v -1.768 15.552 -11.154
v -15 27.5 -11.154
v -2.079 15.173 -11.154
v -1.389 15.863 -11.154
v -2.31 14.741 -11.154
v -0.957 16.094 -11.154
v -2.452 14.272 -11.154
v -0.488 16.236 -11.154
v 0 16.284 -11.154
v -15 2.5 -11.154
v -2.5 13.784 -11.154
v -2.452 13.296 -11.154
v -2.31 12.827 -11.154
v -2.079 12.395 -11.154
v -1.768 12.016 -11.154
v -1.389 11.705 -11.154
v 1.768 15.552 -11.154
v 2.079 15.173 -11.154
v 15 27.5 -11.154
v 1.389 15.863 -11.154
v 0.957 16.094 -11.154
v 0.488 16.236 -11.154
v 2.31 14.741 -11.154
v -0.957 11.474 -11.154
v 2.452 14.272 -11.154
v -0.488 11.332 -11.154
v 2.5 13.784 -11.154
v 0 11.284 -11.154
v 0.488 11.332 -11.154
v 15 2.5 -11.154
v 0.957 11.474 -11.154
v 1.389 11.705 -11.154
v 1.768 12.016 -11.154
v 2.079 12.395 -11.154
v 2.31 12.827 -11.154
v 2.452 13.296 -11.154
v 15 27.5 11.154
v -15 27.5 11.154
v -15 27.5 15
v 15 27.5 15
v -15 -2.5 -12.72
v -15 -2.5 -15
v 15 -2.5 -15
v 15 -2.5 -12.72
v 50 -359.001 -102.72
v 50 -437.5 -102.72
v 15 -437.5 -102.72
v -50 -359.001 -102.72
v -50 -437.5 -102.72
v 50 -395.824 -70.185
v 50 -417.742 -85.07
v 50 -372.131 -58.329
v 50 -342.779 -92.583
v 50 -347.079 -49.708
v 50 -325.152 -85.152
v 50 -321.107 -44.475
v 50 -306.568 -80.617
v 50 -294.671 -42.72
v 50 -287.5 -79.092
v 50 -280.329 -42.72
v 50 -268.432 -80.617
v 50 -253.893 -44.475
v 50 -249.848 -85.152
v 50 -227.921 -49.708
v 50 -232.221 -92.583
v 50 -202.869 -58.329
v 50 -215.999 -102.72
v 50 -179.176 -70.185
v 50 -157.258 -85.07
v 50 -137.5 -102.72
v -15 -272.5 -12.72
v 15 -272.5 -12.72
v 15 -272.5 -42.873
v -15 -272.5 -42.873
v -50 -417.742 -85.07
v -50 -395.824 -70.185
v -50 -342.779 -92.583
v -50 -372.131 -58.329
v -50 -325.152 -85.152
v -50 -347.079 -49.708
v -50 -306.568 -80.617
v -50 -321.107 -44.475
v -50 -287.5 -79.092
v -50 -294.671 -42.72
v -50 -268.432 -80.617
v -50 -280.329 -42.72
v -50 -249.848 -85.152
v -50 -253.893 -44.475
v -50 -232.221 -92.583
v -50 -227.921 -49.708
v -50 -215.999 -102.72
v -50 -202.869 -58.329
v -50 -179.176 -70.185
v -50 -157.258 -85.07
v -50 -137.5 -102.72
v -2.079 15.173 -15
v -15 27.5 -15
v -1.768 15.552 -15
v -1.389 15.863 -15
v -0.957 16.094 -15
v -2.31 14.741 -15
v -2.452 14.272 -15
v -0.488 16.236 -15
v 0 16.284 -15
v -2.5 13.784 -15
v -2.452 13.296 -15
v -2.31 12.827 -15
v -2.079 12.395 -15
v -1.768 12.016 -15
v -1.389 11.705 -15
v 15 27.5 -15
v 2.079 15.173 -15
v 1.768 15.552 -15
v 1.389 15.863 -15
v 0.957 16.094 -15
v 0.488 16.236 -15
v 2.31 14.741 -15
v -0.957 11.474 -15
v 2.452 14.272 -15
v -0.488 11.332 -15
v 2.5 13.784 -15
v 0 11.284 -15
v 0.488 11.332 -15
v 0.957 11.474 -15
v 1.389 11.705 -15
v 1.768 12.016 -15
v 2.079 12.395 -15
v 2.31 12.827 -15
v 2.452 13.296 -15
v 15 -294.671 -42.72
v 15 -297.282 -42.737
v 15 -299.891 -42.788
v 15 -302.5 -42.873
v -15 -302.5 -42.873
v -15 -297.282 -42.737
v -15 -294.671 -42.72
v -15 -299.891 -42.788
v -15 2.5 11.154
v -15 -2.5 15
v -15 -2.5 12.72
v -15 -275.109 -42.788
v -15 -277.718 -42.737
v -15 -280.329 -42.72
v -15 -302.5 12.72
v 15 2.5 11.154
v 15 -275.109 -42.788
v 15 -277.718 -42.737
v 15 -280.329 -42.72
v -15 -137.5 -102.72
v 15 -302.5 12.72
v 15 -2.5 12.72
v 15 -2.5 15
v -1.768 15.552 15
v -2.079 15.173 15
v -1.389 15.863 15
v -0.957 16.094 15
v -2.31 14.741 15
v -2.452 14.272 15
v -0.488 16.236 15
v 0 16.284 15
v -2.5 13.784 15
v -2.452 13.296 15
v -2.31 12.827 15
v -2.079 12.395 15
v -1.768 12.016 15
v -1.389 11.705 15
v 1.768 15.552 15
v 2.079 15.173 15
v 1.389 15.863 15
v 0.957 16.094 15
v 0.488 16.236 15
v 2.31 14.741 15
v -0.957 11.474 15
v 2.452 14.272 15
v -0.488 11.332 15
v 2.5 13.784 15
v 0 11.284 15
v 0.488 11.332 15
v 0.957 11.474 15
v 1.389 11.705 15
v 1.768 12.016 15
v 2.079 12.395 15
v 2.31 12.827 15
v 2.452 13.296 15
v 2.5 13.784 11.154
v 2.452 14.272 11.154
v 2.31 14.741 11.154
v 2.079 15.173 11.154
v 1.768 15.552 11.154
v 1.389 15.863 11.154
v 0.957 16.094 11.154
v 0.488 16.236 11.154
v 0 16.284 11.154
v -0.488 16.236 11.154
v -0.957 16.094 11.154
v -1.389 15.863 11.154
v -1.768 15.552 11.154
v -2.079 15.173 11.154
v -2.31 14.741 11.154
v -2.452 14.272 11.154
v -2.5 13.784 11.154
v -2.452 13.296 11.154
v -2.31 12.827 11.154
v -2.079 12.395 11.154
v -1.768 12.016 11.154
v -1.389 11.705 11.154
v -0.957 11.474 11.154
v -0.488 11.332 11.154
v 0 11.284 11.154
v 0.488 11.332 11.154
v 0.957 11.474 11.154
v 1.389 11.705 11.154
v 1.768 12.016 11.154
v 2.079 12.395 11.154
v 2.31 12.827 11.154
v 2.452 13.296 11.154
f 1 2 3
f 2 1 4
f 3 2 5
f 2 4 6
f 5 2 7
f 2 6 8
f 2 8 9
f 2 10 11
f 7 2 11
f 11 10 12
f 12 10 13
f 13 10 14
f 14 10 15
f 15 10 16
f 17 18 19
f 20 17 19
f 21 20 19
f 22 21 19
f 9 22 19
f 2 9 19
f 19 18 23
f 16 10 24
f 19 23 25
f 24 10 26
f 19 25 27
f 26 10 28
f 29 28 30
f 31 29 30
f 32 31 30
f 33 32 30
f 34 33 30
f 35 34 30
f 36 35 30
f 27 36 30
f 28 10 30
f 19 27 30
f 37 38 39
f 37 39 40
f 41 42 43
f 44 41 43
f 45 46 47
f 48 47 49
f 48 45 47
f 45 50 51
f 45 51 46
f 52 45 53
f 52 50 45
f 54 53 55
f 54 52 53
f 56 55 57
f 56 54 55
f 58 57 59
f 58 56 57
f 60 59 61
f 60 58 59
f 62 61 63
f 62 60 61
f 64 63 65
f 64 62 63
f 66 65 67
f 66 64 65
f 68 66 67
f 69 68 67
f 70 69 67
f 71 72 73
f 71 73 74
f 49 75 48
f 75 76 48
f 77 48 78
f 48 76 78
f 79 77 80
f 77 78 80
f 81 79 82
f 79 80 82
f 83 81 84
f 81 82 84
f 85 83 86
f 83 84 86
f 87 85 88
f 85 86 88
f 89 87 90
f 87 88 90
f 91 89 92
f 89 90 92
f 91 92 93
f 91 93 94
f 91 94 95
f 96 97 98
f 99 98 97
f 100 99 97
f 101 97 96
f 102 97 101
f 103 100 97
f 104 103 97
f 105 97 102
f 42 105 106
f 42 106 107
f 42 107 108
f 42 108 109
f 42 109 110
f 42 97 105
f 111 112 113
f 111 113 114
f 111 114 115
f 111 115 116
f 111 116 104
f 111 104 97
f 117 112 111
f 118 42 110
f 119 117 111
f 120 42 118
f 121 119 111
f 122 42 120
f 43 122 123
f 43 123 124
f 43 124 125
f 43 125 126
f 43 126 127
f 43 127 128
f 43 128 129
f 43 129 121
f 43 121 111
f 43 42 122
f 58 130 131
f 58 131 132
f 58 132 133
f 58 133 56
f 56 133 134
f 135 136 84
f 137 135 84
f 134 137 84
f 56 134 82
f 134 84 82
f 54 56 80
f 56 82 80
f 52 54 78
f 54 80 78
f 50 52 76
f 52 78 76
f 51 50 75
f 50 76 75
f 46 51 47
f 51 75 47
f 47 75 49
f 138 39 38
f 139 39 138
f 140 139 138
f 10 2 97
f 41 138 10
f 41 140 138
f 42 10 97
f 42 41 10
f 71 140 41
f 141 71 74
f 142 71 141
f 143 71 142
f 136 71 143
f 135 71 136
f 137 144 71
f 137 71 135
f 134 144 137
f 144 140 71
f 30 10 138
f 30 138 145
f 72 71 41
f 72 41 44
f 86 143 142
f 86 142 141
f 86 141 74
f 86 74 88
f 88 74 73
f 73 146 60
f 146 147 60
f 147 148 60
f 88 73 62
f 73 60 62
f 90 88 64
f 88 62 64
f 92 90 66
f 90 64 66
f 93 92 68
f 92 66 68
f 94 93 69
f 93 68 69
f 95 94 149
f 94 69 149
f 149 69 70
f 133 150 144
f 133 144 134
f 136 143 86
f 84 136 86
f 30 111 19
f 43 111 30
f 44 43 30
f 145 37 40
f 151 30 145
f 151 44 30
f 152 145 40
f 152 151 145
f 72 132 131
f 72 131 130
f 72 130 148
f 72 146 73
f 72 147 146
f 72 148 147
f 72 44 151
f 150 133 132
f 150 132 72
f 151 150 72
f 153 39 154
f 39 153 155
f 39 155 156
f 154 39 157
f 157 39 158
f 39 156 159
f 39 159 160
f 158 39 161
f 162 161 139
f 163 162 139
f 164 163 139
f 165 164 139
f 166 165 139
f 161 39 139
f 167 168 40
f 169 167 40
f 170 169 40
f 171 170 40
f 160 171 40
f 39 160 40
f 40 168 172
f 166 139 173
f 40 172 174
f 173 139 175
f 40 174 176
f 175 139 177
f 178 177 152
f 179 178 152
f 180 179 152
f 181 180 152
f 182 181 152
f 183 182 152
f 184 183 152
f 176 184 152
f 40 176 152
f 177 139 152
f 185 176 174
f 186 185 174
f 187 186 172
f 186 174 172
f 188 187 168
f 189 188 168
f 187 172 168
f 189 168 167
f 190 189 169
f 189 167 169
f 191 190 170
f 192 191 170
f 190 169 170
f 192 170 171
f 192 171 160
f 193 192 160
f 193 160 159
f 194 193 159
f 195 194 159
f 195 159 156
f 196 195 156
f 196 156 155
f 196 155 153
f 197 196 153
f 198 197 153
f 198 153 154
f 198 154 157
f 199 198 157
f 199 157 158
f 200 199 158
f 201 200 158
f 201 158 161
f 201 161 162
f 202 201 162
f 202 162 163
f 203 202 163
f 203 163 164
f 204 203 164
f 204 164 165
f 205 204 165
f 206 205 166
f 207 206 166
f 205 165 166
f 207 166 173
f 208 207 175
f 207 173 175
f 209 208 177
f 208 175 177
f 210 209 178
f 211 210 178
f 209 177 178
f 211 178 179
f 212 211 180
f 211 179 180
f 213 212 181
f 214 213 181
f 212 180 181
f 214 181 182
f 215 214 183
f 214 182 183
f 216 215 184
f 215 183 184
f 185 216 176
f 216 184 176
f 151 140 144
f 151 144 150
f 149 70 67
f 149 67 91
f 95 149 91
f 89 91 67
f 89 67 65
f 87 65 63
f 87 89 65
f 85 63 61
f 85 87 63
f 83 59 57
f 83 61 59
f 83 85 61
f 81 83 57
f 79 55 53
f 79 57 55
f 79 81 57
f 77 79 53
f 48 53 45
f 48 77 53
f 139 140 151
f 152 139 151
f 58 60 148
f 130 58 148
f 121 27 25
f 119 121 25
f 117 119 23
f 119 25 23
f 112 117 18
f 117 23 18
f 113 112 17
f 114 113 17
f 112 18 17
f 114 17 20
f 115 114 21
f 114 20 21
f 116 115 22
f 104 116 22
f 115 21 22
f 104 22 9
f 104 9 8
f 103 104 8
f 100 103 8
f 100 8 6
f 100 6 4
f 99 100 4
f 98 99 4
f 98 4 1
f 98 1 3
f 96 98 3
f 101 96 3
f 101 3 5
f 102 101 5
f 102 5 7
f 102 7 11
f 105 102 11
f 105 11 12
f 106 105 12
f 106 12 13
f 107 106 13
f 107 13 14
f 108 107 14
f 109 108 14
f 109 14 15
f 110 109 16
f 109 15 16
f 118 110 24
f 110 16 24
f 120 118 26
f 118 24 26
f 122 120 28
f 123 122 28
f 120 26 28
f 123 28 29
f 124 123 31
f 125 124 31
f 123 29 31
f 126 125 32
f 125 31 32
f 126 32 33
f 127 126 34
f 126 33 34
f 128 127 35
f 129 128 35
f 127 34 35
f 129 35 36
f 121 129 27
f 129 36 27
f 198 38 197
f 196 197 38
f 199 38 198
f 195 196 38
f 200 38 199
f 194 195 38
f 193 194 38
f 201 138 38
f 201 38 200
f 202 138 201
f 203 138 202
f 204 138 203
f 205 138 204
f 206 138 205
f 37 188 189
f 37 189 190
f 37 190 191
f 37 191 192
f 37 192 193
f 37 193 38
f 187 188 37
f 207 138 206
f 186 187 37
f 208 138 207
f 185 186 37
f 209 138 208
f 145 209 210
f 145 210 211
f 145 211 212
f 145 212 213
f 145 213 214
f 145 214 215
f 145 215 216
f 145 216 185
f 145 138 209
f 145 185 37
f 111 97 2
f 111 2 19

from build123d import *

# Parameters (mm, degrees)
SKETCH_1_W               = 30
SKETCH_1_H               = 22.307
EXTRUDE_1_DEPTH          = 2.5
EXTRUDE_START            = -5
SKETCH_4_W               = 30
SKETCH_4_H               = 3.8465
EXTRUDE_5_DEPTH          = 30
SKETCH_5_R               = 2.5
CUT_EXTRUDE_1_DEPTH      = 44.373378932
SKETCH_6_W               = 30
SKETCH_6_H               = 25.44
EXTRUDE_6_DEPTH          = 300
SKETCH_8_W               = 30
SKETCH_8_H               = 30
EXTRUDE_8_DEPTH          = 30
SKETCH_10_W              = 100
SKETCH_10_H              = 300
EXTRUDE_9_DEPTH          = 60
FILLET_1_R               = 200
FILLET_2_R               = 200
CUT_EXTRUDE_3_DEPTH      = 461.388584133
CUT_EXTRUDE_3_DEPTH_BACK = 461.388584133


with BuildPart() as part:
    # 草图1 → 凸台-拉伸1 (new, symmetric)
    with BuildSketch(Plane(origin=(0, 0, 0), x_dir=(1, 0, 0), z_dir=(0, 1, 0))):
        Rectangle(SKETCH_1_W, SKETCH_1_H)
    extrude(amount=EXTRUDE_1_DEPTH, both=True)

    # 草图4 → 凸台-拉伸5 (add)
    with BuildSketch(Plane(origin=(0, 2.5, 0), x_dir=(1, 0, 0), z_dir=(0, 1, 0)).offset(EXTRUDE_START)):
        with Locations((0, -13.07675)):
            Rectangle(SKETCH_4_W, SKETCH_4_H)
        with Locations((0, 13.07675)):
            Rectangle(SKETCH_4_W, SKETCH_4_H)
    extrude(amount=EXTRUDE_5_DEPTH)

    # 草图5 → 切除-拉伸1 (cut, through all)
    with BuildSketch(Plane.XY.offset(15)):
        with Locations((0, 13.784)):
            Circle(SKETCH_5_R)
    extrude(amount=-CUT_EXTRUDE_1_DEPTH, mode=Mode.SUBTRACT)

    # 草图6 → 凸台-拉伸6 (add)
    with BuildSketch(Plane.XZ.offset(2.5)):
        Rectangle(SKETCH_6_W, SKETCH_6_H)
    extrude(amount=EXTRUDE_6_DEPTH)

    # 草图8 → 凸台-拉伸8 (add)
    with BuildSketch(Plane(origin=(0, 0, -12.72), x_dir=(-1, 0, 0), z_dir=(0, 0, -1))):
        with Locations((0, -287.5)):
            Rectangle(SKETCH_8_W, SKETCH_8_H)
    extrude(amount=EXTRUDE_8_DEPTH)

    # 草图10 → 凸台-拉伸9 (add)
    with BuildSketch(Plane(origin=(0, 0, -42.72), x_dir=(-1, 0, 0), z_dir=(0, 0, -1))):
        with Locations((0, -287.5)):
            Rectangle(SKETCH_10_W, SKETCH_10_H)
    extrude(amount=EXTRUDE_9_DEPTH)

    # 圆角1
    # the kernel refuses this fillet: 200 mm, written as the material it takes off along each edge
    with BuildSketch(Plane(origin=(-407.071421427, -437.5, -42.72), x_dir=(0, 1, 0), z_dir=(1, 0, 0))) as fillet_1_piece_1_section:
        with BuildLine():
            CenterArc((142.828568571, -200), FILLET_1_R, 90, 45.572995999)
            Line((0, -60), (-2.856571371, -57.2))
            ThreePointArc((-2.856571371, -57.2), (-4, -30), (-4, 0))
            Line((-4, 0), (0, 4))
            Line((0, 4), (142.828568571, 4))
            Line((142.828568571, 4), (142.828568571, 0))
        make_face()
    fillet_1_piece_1 = extrude(amount=814.142842854, mode=Mode.PRIVATE)
    fillet_1_piece_1 = split(fillet_1_piece_1, bisect_by=Plane(origin=(-211.035710714, -302.5, -40.745799624), z_dir=(0, 1, 0)), keep=Keep.TOP, mode=Mode.PRIVATE)
    fillet_1_piece_1 = split(fillet_1_piece_1, bisect_by=Plane(origin=(-15, -298.610396999, -40.745799624), z_dir=(-1, 0, 0)), keep=Keep.TOP, mode=Mode.PRIVATE)
    add(fillet_1_piece_1, mode=Mode.SUBTRACT)
    with BuildSketch(Plane(origin=(-407.071421427, -437.5, -42.72), x_dir=(0, 1, 0), z_dir=(1, 0, 0))) as fillet_1_piece_2_section:
        with BuildLine():
            CenterArc((142.828568571, -200), FILLET_1_R, 90, 45.572995999)
            Line((0, -60), (-2.856571371, -57.2))
            ThreePointArc((-2.856571371, -57.2), (-4, -30), (-4, 0))
            Line((-4, 0), (0, 4))
            Line((0, 4), (142.828568571, 4))
            Line((142.828568571, 4), (142.828568571, 0))
        make_face()
    fillet_1_piece_2 = extrude(amount=814.142842854, mode=Mode.PRIVATE)
    fillet_1_piece_2 = split(fillet_1_piece_2, bisect_by=Plane(origin=(-211.035710714, -302.5, -57.711003377), z_dir=(0, -1, 0)), keep=Keep.TOP, mode=Mode.PRIVATE)
    fillet_1_piece_2 = split(fillet_1_piece_2, bisect_by=Plane(origin=(-15, -400.231636696, -57.711003377), z_dir=(-1, 0, 0)), keep=Keep.TOP, mode=Mode.PRIVATE)
    add(fillet_1_piece_2, mode=Mode.SUBTRACT)
    with BuildSketch(Plane(origin=(-407.071421427, -437.5, -42.72), x_dir=(0, 1, 0), z_dir=(1, 0, 0))) as fillet_1_piece_3_section:
        with BuildLine():
            CenterArc((142.828568571, -200), FILLET_1_R, 90, 45.572995999)
            Line((0, -60), (-2.856571371, -57.2))
            ThreePointArc((-2.856571371, -57.2), (-4, -30), (-4, 0))
            Line((-4, 0), (0, 4))
            Line((0, 4), (142.828568571, 4))
            Line((142.828568571, 4), (142.828568571, 0))
        make_face()
    fillet_1_piece_3 = extrude(amount=814.142842854, mode=Mode.PRIVATE)
    fillet_1_piece_3 = split(fillet_1_piece_3, bisect_by=Plane(origin=(0, -302.5, -57.711003377), z_dir=(0, -1, 0)), keep=Keep.TOP, mode=Mode.PRIVATE)
    fillet_1_piece_3 = split(fillet_1_piece_3, bisect_by=Plane(origin=(15, -400.231636696, -57.711003377), z_dir=(-1, 0, 0)), keep=Keep.TOP, mode=Mode.PRIVATE)
    fillet_1_piece_3 = split(fillet_1_piece_3, bisect_by=Plane(origin=(-15, -400.231636696, -57.711003377), z_dir=(1, 0, 0)), keep=Keep.TOP, mode=Mode.PRIVATE)
    add(fillet_1_piece_3, mode=Mode.SUBTRACT)
    with BuildSketch(Plane(origin=(-407.071421427, -437.5, -42.72), x_dir=(0, 1, 0), z_dir=(1, 0, 0))) as fillet_1_piece_4_section:
        with BuildLine():
            CenterArc((142.828568571, -200), FILLET_1_R, 90, 45.572995999)
            Line((0, -60), (-2.856571371, -57.2))
            ThreePointArc((-2.856571371, -57.2), (-4, -30), (-4, 0))
            Line((-4, 0), (0, 4))
            Line((0, 4), (142.828568571, 4))
            Line((142.828568571, 4), (142.828568571, 0))
        make_face()
    fillet_1_piece_4 = extrude(amount=814.142842854, mode=Mode.PRIVATE)
    fillet_1_piece_4 = split(fillet_1_piece_4, bisect_by=Plane(origin=(211.035710714, -302.5, -40.745799624), z_dir=(0, 1, 0)), keep=Keep.TOP, mode=Mode.PRIVATE)
    fillet_1_piece_4 = split(fillet_1_piece_4, bisect_by=Plane(origin=(15, -298.610396999, -40.745799624), z_dir=(1, 0, 0)), keep=Keep.TOP, mode=Mode.PRIVATE)
    add(fillet_1_piece_4, mode=Mode.SUBTRACT)
    with BuildSketch(Plane(origin=(-407.071421427, -437.5, -42.72), x_dir=(0, 1, 0), z_dir=(1, 0, 0))) as fillet_1_piece_5_section:
        with BuildLine():
            CenterArc((142.828568571, -200), FILLET_1_R, 90, 45.572995999)
            Line((0, -60), (-2.856571371, -57.2))
            ThreePointArc((-2.856571371, -57.2), (-4, -30), (-4, 0))
            Line((-4, 0), (0, 4))
            Line((0, 4), (142.828568571, 4))
            Line((142.828568571, 4), (142.828568571, 0))
        make_face()
    fillet_1_piece_5 = extrude(amount=814.142842854, mode=Mode.PRIVATE)
    fillet_1_piece_5 = split(fillet_1_piece_5, bisect_by=Plane(origin=(211.035710714, -302.5, -57.711003377), z_dir=(0, -1, 0)), keep=Keep.TOP, mode=Mode.PRIVATE)
    fillet_1_piece_5 = split(fillet_1_piece_5, bisect_by=Plane(origin=(15, -400.231636696, -57.711003377), z_dir=(1, 0, 0)), keep=Keep.TOP, mode=Mode.PRIVATE)
    add(fillet_1_piece_5, mode=Mode.SUBTRACT)

    # 圆角2
    # the kernel refuses this fillet: 200 mm, written as the material it takes off along each edge
    with BuildSketch(Plane(origin=(407.071421427, -137.5, -42.72), x_dir=(0, 0, -1), z_dir=(-1, 0, 0))) as fillet_2_piece_1_section:
        with BuildLine():
            CenterArc((200, 142.828568571), FILLET_2_R, 180, 45.572995999)
            Line((0, 142.828568571), (-4, 142.828568571))
            Line((-4, 142.828568571), (-4, 0))
            Line((-4, 0), (0, -4))
            ThreePointArc((0, -4), (30, -4), (57.2, -2.856571371))
            Line((57.2, -2.856571371), (60, 0))
        make_face()
    fillet_2_piece_1 = extrude(amount=814.142842854, mode=Mode.PRIVATE)
    fillet_2_piece_1 = split(fillet_2_piece_1, bisect_by=Plane(origin=(15, -174.768363304, -57.711003377), z_dir=(1, 0, 0)), keep=Keep.TOP, mode=Mode.PRIVATE)
    fillet_2_piece_1 = split(fillet_2_piece_1, bisect_by=Plane(origin=(211.035710714, -272.5, -57.711003377), z_dir=(0, 1, 0)), keep=Keep.TOP, mode=Mode.PRIVATE)
    add(fillet_2_piece_1, mode=Mode.SUBTRACT)
    with BuildSketch(Plane(origin=(407.071421427, -137.5, -42.72), x_dir=(0, 0, -1), z_dir=(-1, 0, 0))) as fillet_2_piece_2_section:
        with BuildLine():
            CenterArc((200, 142.828568571), FILLET_2_R, 180, 45.572995999)
            Line((0, 142.828568571), (-4, 142.828568571))
            Line((-4, 142.828568571), (-4, 0))
            Line((-4, 0), (0, -4))
            ThreePointArc((0, -4), (30, -4), (57.2, -2.856571371))
            Line((57.2, -2.856571371), (60, 0))
        make_face()
    fillet_2_piece_2 = extrude(amount=814.142842854, mode=Mode.PRIVATE)
    fillet_2_piece_2 = split(fillet_2_piece_2, bisect_by=Plane(origin=(15, -276.389603001, -40.745799624), z_dir=(1, 0, 0)), keep=Keep.TOP, mode=Mode.PRIVATE)
    fillet_2_piece_2 = split(fillet_2_piece_2, bisect_by=Plane(origin=(211.035710714, -272.5, -40.745799624), z_dir=(0, -1, 0)), keep=Keep.TOP, mode=Mode.PRIVATE)
    add(fillet_2_piece_2, mode=Mode.SUBTRACT)
    with BuildSketch(Plane(origin=(407.071421427, -137.5, -42.72), x_dir=(0, 0, -1), z_dir=(-1, 0, 0))) as fillet_2_piece_3_section:
        with BuildLine():
            CenterArc((200, 142.828568571), FILLET_2_R, 180, 45.572995999)
            Line((0, 142.828568571), (-4, 142.828568571))
            Line((-4, 142.828568571), (-4, 0))
            Line((-4, 0), (0, -4))
            ThreePointArc((0, -4), (30, -4), (57.2, -2.856571371))
            Line((57.2, -2.856571371), (60, 0))
        make_face()
    fillet_2_piece_3 = extrude(amount=814.142842854, mode=Mode.PRIVATE)
    fillet_2_piece_3 = split(fillet_2_piece_3, bisect_by=Plane(origin=(15, -174.768363304, -57.711003377), z_dir=(-1, 0, 0)), keep=Keep.TOP, mode=Mode.PRIVATE)
    fillet_2_piece_3 = split(fillet_2_piece_3, bisect_by=Plane(origin=(0, -272.5, -57.711003377), z_dir=(0, 1, 0)), keep=Keep.TOP, mode=Mode.PRIVATE)
    fillet_2_piece_3 = split(fillet_2_piece_3, bisect_by=Plane(origin=(-15, -174.768363304, -57.711003377), z_dir=(1, 0, 0)), keep=Keep.TOP, mode=Mode.PRIVATE)
    add(fillet_2_piece_3, mode=Mode.SUBTRACT)
    with BuildSketch(Plane(origin=(407.071421427, -137.5, -42.72), x_dir=(0, 0, -1), z_dir=(-1, 0, 0))) as fillet_2_piece_4_section:
        with BuildLine():
            CenterArc((200, 142.828568571), FILLET_2_R, 180, 45.572995999)
            Line((0, 142.828568571), (-4, 142.828568571))
            Line((-4, 142.828568571), (-4, 0))
            Line((-4, 0), (0, -4))
            ThreePointArc((0, -4), (30, -4), (57.2, -2.856571371))
            Line((57.2, -2.856571371), (60, 0))
        make_face()
    fillet_2_piece_4 = extrude(amount=814.142842854, mode=Mode.PRIVATE)
    fillet_2_piece_4 = split(fillet_2_piece_4, bisect_by=Plane(origin=(-211.035710714, -272.5, -57.711003377), z_dir=(0, 1, 0)), keep=Keep.TOP, mode=Mode.PRIVATE)
    fillet_2_piece_4 = split(fillet_2_piece_4, bisect_by=Plane(origin=(-15, -174.768363304, -57.711003377), z_dir=(-1, 0, 0)), keep=Keep.TOP, mode=Mode.PRIVATE)
    add(fillet_2_piece_4, mode=Mode.SUBTRACT)
    with BuildSketch(Plane(origin=(407.071421427, -137.5, -42.72), x_dir=(0, 0, -1), z_dir=(-1, 0, 0))) as fillet_2_piece_5_section:
        with BuildLine():
            CenterArc((200, 142.828568571), FILLET_2_R, 180, 45.572995999)
            Line((0, 142.828568571), (-4, 142.828568571))
            Line((-4, 142.828568571), (-4, 0))
            Line((-4, 0), (0, -4))
            ThreePointArc((0, -4), (30, -4), (57.2, -2.856571371))
            Line((57.2, -2.856571371), (60, 0))
        make_face()
    fillet_2_piece_5 = extrude(amount=814.142842854, mode=Mode.PRIVATE)
    fillet_2_piece_5 = split(fillet_2_piece_5, bisect_by=Plane(origin=(-211.035710714, -272.5, -40.745799624), z_dir=(0, -1, 0)), keep=Keep.TOP, mode=Mode.PRIVATE)
    fillet_2_piece_5 = split(fillet_2_piece_5, bisect_by=Plane(origin=(-15, -276.389603001, -40.745799624), z_dir=(-1, 0, 0)), keep=Keep.TOP, mode=Mode.PRIVATE)
    add(fillet_2_piece_5, mode=Mode.SUBTRACT)

    # 草图11 → 切除-拉伸3 (cut, two sides: drawn at the far end of the back side and taken through both)
    with BuildSketch(Plane(origin=(50, 0, 0), x_dir=(0, 0, -1), z_dir=(1, 0, 0)).offset(-CUT_EXTRUDE_3_DEPTH_BACK)):
        with BuildLine():
            Line((590.156631814, 440.987720299), (102.72, -215.998843293))
            ThreePointArc((102.72, -215.998843293), (79.092115208, -287.5), (102.72, -359.001156707))
            Line((102.72, -359.001156707), (590.156631814, -1015.987720299))
            Line((590.156631814, -1015.987720299), (2226.281095019, -1015.987720299))
            Line((2226.281095019, -1015.987720299), (2226.281095019, 440.987720299))
            Line((2226.281095019, 440.987720299), (590.156631814, 440.987720299))
        make_face()
    extrude(amount=CUT_EXTRUDE_3_DEPTH + CUT_EXTRUDE_3_DEPTH_BACK, mode=Mode.SUBTRACT)


solid = part.part
